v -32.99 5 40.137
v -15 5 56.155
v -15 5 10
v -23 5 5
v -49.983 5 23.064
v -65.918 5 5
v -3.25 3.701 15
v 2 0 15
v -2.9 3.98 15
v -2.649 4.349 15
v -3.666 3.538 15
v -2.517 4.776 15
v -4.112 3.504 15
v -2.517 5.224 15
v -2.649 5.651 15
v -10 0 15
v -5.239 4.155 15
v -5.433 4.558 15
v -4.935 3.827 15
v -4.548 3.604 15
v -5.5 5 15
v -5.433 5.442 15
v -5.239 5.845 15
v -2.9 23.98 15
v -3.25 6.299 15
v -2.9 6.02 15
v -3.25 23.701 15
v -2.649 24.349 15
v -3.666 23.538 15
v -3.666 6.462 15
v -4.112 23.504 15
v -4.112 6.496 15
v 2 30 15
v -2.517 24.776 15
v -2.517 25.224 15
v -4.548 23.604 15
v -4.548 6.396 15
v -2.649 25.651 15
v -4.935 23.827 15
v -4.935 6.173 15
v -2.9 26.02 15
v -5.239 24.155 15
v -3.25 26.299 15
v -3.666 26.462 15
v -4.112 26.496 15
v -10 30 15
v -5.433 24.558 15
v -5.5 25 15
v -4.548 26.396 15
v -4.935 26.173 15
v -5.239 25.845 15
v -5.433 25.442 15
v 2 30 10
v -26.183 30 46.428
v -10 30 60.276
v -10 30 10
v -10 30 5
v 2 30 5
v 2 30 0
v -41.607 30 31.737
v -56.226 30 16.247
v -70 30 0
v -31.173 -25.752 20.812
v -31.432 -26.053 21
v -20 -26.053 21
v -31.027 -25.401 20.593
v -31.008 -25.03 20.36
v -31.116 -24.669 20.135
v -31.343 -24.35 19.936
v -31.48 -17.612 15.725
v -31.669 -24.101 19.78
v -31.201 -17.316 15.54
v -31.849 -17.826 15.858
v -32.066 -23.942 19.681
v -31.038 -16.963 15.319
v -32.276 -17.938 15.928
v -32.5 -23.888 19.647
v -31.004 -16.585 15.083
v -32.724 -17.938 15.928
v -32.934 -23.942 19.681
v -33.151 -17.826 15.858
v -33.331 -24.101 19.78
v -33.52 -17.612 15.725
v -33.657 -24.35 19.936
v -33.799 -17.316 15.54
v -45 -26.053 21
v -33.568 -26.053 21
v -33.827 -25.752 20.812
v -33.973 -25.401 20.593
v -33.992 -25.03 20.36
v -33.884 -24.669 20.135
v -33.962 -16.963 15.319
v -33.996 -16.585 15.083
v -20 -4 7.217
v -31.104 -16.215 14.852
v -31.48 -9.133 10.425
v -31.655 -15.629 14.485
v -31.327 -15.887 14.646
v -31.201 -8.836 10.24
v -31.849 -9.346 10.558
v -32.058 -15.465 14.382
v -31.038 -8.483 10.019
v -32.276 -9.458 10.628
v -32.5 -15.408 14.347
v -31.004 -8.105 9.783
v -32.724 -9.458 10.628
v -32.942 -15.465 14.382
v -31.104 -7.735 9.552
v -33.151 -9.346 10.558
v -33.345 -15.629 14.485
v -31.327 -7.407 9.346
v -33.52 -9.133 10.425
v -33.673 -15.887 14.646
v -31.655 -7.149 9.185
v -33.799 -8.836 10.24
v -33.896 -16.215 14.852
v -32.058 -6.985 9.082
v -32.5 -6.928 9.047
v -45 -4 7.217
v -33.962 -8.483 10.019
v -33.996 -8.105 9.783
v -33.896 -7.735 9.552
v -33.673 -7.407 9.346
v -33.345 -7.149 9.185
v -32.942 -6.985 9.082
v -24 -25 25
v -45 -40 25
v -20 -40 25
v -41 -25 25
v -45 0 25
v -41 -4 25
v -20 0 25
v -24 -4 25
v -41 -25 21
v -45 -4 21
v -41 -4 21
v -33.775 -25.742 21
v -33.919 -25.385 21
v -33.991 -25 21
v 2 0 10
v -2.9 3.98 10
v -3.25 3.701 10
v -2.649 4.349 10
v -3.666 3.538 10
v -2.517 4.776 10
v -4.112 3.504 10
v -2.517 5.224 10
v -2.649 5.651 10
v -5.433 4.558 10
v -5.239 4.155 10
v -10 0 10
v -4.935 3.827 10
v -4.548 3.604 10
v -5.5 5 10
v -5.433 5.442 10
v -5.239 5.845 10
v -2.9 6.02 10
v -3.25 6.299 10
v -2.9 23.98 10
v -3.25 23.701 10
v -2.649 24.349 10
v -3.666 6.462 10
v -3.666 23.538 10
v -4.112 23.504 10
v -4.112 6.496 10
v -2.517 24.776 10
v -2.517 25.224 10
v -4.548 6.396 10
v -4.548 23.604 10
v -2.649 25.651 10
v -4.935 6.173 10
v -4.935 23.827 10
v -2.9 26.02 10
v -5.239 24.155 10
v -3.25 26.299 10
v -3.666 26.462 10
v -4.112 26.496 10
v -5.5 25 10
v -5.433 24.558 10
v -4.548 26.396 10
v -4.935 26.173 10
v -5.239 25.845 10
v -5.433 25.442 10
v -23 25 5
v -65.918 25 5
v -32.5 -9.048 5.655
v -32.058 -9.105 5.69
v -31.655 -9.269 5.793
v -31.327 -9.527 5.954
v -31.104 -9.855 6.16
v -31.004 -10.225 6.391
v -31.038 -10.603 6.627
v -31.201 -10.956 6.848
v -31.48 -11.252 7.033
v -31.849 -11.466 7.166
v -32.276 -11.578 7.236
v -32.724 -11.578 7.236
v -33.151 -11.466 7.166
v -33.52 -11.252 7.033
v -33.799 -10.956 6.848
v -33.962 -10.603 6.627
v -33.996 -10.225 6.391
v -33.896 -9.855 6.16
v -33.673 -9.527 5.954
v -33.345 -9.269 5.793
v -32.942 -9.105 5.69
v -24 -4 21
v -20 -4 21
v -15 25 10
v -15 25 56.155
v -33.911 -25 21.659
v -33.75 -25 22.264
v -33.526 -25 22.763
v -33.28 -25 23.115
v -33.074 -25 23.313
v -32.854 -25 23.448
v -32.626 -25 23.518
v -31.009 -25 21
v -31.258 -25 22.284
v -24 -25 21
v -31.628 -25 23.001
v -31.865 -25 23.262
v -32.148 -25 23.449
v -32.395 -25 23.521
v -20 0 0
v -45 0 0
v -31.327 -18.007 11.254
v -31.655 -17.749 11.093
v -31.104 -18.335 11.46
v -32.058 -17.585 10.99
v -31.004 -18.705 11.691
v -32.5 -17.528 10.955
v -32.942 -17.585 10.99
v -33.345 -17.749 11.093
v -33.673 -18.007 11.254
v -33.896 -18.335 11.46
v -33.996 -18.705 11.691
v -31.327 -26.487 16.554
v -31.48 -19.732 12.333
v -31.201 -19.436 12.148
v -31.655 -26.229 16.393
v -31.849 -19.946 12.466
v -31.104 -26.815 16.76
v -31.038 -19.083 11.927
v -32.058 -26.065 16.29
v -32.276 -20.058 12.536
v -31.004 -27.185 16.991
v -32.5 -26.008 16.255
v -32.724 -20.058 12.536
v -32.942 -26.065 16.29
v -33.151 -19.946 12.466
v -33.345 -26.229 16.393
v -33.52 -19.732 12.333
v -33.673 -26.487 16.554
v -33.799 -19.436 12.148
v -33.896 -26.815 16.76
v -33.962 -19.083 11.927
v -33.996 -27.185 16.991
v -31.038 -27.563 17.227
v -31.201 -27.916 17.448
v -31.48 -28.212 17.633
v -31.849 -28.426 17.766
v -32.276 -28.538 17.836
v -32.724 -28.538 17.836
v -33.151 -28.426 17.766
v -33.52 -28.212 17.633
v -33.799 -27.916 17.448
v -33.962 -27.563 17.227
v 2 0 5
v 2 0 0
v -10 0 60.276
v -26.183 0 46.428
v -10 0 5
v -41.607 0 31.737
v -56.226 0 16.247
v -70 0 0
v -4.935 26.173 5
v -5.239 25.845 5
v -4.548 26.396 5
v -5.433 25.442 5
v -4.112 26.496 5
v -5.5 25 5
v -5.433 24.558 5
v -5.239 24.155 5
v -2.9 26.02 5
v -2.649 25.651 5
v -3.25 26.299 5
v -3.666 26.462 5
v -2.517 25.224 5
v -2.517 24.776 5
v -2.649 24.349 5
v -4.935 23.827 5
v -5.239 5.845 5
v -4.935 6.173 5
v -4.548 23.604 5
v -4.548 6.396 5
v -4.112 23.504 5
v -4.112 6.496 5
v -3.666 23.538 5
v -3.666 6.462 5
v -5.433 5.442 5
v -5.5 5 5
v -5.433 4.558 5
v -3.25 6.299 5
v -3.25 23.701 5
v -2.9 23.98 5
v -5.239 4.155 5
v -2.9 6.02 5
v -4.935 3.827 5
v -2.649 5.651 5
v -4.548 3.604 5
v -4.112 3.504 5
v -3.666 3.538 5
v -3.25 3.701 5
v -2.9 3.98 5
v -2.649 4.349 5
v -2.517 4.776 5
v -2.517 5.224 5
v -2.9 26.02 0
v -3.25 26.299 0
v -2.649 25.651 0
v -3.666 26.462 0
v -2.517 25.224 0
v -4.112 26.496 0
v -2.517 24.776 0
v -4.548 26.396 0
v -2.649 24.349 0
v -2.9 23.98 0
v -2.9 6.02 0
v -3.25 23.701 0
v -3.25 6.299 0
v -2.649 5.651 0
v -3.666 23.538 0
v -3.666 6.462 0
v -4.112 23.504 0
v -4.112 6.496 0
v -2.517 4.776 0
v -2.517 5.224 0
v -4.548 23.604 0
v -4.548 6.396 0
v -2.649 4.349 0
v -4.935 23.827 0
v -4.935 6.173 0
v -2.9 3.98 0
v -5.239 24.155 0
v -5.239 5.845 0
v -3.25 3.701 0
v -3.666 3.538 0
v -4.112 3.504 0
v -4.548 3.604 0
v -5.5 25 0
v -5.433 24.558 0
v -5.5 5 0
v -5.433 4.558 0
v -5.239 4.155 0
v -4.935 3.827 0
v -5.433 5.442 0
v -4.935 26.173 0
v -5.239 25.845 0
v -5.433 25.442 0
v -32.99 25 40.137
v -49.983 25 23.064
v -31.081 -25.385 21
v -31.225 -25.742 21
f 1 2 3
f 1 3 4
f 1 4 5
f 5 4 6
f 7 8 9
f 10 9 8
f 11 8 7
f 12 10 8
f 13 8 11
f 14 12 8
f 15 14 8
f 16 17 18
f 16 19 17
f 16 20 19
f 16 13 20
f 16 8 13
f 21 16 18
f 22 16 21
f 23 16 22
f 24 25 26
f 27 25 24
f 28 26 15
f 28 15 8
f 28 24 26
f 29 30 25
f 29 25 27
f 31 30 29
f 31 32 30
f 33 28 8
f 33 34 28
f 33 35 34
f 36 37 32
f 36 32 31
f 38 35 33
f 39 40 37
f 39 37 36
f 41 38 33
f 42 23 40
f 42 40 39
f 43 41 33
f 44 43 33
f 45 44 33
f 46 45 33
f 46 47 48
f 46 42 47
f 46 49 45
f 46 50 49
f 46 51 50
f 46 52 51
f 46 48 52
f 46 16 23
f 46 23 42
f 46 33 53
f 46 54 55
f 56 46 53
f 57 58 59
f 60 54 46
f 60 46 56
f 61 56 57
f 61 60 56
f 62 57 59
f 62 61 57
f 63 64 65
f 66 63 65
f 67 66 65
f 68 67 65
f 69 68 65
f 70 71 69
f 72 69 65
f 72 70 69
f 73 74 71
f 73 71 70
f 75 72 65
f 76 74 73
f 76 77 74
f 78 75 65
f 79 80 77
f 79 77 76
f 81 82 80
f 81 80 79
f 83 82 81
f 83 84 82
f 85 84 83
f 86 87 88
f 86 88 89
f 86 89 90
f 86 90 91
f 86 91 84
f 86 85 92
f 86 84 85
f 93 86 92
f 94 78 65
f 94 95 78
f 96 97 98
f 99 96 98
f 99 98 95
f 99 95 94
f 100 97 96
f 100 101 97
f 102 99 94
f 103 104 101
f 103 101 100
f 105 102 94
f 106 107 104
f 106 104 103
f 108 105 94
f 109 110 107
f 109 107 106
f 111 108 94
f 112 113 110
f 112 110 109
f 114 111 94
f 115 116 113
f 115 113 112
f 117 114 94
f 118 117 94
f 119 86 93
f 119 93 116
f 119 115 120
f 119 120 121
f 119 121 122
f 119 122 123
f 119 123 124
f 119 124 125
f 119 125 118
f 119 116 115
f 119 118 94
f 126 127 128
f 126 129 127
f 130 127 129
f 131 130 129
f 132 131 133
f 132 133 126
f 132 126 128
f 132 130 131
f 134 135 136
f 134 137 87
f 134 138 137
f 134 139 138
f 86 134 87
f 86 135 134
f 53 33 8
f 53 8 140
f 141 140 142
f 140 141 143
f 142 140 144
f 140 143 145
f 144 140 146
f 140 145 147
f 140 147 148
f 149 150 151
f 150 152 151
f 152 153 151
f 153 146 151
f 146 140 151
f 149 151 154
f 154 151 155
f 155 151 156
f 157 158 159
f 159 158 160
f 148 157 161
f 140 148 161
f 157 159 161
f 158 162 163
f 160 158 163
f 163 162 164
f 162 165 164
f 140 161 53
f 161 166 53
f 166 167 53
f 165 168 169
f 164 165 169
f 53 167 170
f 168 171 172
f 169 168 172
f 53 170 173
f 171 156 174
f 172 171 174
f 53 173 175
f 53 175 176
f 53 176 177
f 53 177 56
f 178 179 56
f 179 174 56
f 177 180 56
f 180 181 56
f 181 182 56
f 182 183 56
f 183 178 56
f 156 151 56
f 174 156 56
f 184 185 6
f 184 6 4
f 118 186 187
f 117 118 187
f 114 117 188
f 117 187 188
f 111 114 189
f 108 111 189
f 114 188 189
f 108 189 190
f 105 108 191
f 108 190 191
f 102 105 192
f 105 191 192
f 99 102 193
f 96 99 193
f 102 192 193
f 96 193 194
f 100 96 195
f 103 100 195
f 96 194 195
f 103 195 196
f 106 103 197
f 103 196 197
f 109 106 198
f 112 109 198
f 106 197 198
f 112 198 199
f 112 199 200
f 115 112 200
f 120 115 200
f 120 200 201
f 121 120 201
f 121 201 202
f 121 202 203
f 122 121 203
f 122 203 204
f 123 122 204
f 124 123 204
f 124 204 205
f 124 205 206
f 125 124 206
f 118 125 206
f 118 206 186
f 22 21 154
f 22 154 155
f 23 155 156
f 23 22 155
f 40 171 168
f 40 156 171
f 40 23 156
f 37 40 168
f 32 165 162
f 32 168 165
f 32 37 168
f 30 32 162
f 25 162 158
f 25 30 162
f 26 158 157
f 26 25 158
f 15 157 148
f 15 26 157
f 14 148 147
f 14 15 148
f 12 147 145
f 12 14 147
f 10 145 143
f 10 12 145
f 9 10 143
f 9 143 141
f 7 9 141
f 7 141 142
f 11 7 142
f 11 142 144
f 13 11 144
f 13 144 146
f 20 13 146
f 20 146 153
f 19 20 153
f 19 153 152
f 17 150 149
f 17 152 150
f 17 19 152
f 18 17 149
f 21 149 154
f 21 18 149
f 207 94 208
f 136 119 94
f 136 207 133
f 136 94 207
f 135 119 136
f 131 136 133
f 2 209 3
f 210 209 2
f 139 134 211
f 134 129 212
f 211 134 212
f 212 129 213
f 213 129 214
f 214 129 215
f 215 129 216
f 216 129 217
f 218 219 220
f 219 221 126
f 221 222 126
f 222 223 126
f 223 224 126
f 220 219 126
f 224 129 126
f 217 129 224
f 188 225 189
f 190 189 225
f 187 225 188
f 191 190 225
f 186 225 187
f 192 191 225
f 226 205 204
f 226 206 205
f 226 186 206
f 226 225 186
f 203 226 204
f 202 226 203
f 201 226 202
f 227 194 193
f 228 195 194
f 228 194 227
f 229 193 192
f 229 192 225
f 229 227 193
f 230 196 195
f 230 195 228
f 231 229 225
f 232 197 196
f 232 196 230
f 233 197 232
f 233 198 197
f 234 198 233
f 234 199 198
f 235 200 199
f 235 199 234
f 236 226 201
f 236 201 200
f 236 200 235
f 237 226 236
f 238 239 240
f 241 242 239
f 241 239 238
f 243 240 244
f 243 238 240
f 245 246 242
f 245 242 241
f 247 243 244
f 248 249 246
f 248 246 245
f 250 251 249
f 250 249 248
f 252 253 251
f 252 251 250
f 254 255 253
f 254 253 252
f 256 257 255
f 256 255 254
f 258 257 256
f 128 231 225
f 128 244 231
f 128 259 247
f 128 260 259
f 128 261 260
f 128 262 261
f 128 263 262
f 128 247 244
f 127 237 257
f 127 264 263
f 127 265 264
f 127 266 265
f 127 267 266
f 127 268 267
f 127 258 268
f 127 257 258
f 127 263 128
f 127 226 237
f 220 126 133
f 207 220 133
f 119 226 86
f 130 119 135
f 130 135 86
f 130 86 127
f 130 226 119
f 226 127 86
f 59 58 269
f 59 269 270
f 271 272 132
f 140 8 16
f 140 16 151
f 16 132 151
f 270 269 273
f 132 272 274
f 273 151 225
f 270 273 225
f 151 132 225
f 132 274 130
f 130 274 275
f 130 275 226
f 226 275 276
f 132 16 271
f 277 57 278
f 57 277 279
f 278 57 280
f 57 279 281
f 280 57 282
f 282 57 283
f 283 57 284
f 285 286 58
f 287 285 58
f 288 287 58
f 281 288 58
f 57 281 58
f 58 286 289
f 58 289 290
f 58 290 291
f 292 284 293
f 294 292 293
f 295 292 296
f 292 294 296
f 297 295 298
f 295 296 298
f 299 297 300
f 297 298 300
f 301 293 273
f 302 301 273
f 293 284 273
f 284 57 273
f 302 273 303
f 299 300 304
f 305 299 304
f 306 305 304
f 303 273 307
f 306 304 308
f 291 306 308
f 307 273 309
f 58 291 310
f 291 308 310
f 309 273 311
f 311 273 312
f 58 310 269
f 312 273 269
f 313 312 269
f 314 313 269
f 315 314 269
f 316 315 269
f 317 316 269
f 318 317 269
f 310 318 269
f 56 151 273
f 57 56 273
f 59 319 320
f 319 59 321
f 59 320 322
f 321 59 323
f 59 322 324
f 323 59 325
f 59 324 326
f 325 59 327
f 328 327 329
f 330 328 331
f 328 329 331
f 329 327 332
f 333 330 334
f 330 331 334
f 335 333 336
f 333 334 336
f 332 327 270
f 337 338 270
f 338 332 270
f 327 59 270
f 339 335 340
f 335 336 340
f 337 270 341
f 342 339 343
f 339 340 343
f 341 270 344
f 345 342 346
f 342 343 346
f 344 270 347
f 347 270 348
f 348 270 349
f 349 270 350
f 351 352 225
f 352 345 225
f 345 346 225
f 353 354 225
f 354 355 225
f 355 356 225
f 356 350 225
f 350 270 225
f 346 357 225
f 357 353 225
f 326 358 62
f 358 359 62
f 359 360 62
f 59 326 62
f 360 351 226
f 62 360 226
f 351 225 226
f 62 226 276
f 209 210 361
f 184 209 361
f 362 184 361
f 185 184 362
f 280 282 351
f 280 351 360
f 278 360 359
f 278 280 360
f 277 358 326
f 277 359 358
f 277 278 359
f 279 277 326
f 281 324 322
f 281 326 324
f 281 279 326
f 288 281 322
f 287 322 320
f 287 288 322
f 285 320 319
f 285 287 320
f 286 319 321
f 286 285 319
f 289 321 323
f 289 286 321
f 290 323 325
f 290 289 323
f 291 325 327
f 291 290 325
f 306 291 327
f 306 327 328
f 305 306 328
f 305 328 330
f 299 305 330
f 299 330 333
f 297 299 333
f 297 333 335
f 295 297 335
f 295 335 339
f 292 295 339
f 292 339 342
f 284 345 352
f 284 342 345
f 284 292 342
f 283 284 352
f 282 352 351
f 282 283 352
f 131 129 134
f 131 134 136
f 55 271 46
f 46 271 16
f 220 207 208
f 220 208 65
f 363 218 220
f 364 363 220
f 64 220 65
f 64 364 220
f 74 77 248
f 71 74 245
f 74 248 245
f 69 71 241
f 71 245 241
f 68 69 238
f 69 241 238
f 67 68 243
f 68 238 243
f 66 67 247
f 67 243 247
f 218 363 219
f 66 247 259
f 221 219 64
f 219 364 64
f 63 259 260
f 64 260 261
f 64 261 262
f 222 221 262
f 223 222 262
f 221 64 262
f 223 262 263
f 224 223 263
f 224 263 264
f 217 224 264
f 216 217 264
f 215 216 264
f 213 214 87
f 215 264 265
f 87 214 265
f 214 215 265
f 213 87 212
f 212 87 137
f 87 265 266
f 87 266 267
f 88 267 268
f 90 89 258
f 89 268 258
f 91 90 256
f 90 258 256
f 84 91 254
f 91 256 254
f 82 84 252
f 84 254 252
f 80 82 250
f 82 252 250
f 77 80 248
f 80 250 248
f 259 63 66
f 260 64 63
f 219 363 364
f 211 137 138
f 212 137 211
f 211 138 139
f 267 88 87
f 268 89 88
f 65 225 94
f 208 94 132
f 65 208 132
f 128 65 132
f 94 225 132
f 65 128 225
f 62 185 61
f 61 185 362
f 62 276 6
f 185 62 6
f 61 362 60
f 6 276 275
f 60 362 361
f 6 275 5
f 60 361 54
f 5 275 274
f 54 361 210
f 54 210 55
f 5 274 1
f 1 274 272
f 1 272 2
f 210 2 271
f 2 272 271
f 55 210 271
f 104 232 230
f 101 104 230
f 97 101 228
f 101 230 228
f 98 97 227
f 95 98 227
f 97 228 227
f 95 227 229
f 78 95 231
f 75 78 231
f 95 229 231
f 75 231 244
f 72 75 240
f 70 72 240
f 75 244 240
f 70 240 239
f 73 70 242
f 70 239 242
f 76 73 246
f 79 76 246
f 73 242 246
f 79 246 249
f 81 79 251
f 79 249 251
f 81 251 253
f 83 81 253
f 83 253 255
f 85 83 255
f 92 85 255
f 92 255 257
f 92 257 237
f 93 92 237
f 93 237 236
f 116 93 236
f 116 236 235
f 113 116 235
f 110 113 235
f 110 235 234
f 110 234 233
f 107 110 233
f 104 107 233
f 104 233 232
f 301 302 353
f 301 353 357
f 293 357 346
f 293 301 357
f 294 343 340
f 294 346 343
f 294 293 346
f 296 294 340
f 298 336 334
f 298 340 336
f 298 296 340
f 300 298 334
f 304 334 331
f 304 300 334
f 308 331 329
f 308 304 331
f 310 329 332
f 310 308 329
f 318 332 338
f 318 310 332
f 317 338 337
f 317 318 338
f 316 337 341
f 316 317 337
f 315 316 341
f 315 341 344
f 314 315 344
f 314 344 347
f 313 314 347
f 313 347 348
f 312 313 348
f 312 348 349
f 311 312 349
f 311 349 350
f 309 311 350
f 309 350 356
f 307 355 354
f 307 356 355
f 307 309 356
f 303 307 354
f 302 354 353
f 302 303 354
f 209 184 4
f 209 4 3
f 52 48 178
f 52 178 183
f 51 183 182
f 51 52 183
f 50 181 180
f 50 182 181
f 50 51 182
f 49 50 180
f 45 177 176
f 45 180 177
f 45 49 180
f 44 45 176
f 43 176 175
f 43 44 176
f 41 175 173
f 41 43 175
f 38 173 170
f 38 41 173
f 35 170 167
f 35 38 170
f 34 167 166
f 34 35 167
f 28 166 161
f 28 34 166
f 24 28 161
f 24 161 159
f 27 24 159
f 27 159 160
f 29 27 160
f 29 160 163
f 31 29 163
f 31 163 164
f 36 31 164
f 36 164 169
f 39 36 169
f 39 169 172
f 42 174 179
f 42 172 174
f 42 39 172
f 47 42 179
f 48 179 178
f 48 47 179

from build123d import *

# Parameters (mm, degrees)
EXTRUDE_1_DEPTH          = 30
CUT_EXTRUDE_1_DEPTH      = 98.124713642
CUT_EXTRUDE_1_DEPTH_BACK = 98.124713642
SKETCH_2_R               = 1.5
CUT_EXTRUDE_6_DEPTH      = 10
EXTRUDE_3_DEPTH          = 12.5
SKETCH_12_W              = 5
SKETCH_12_H              = 30
EXTRUDE_4_DEPTH          = 2
SKETCH_17_W              = 25
SKETCH_17_H              = 25
EXTRUDE_7_DEPTH          = 40
CUT_EXTRUDE_9_DEPTH      = 50
SKETCH_21_R              = 1.5
CUT_EXTRUDE_12_DEPTH     = 7
CUT_EXTRUDE_13_DEPTH     = 500
SKETCH_23_W              = 17
SKETCH_23_H              = 21
CUT_EXTRUDE_14_DEPTH     = 4


with BuildPart() as part:
    # 草图1 → 凸台-拉伸1 (new body)
    with BuildSketch(Plane(origin=(0, 0, 0), x_dir=(1, 0, 0), z_dir=(0, 1, 0))):
        with BuildLine():
            Line((0, 0), (-70, 0))
            ThreePointArc((-70, 0), (-41.606545869, -31.737243891), (-10, -60.276114672))
            Line((-10, -60.276114672), (-10, -15))
            Line((-10, -15), (0, -15))
            Line((0, -15), (0, -10))
            Line((0, -10), (-10, -10))
            Line((-10, -10), (-10, -5))
            Line((-10, -5), (0, -5))
            Line((0, -5), (0, 0))
        make_face()
    extrude(amount=EXTRUDE_1_DEPTH)

    # 草图2 → 切除-拉伸1 (cut, two sides: drawn at the far end of the back side and taken through both)
    with BuildSketch(Plane(origin=(0, 0, 0), x_dir=(-1, 0, 0), z_dir=(0, 0, -1)).offset(-CUT_EXTRUDE_1_DEPTH_BACK)):
        with Locations((4, 25)):
            Circle(SKETCH_2_R)
        with Locations((4, 5)):
            Circle(SKETCH_2_R)
    extrude(amount=CUT_EXTRUDE_1_DEPTH + CUT_EXTRUDE_1_DEPTH_BACK, mode=Mode.SUBTRACT)

    # 草图9 → 切除-拉伸6 (cut, symmetric)
    with BuildSketch(Plane(origin=(0, 15, 0), x_dir=(1, 0, 0), z_dir=(0, 1, 0))):
        with BuildLine():
            Line((-65.918016471, -5), (-59.391772218, -5))
            Line((-59.391772218, -5), (-15, -5))
            Line((-15, -5), (-15, -15))
            Line((-15, -15), (-15, -49.60330608))
            Line((-15, -49.60330608), (-15, -56.155472209))
            ThreePointArc((-15, -56.155472209), (-41.615194331, -31.728555364), (-65.918016471, -5))
        make_face()
    extrude(amount=CUT_EXTRUDE_6_DEPTH, both=True, mode=Mode.SUBTRACT)

    # 草图11 → 凸台-拉伸3 (add, symmetric)
    with BuildSketch(Plane(origin=(0, 15, 0), x_dir=(1, 0, 0), z_dir=(0, 1, 0))):
        Polygon((-15, -5), (-23, -5), (-15, -10), align=None)
    extrude(amount=EXTRUDE_3_DEPTH, both=True)

    # 草图12 → 凸台-拉伸4 (add)
    with BuildSketch(Plane(origin=(0, 0, 0), x_dir=(0, 0, -1), z_dir=(1, 0, 0))):
        with Locations((-12.5, 15)):
            Rectangle(SKETCH_12_W, SKETCH_12_H)
        with Locations((-2.5, 15)):
            Rectangle(SKETCH_12_W, SKETCH_12_H)
    extrude(amount=EXTRUDE_4_DEPTH)

    # 草图17 → 凸台-拉伸7 (add)
    with BuildSketch(Plane.XZ):
        with Locations((-32.5, 12.5)):
            Rectangle(SKETCH_17_W, SKETCH_17_H)
    extrude(amount=EXTRUDE_7_DEPTH)

    # 草图18 → 切除-拉伸9 (cut)
    with BuildSketch(Plane.ZY.offset(45)):
        Polygon((0, 0), (25, -40), (0, -40), align=None)
    extrude(amount=-CUT_EXTRUDE_9_DEPTH, mode=Mode.SUBTRACT)

    # 草图21 → 切除-拉伸12 (cut)
    with BuildSketch(Plane(origin=(0, 0, 0), x_dir=(-1, 0, 0), z_dir=(0, -0.52999894000318, -0.8479983040050879))):
        with Locations(Location((32.5, -22.16990566, 0), (0, 0, 90))):
            Circle(SKETCH_21_R)
        with Locations(Location((32.5, -12.16990566, 0), (0, 0, 90))):
            Circle(SKETCH_21_R)
        with Locations(Location((32.5, -32.16990566, 0), (0, 0, 90))):
            Circle(SKETCH_21_R)
    extrude(amount=-CUT_EXTRUDE_12_DEPTH, mode=Mode.SUBTRACT)

    # 草图22 → 切除-拉伸13 (cut)
    with BuildSketch(Plane.ZY.offset(45)):
        Polygon((7.216990566, -4), (21, -4), (21, -26.052815094), align=None)
    extrude(amount=-CUT_EXTRUDE_13_DEPTH, mode=Mode.SUBTRACT)

    # 草图23 → 切除-拉伸14 (cut)
    with BuildSketch(Plane.XY.offset(25)):
        with Locations((-32.5, -14.5)):
            Rectangle(SKETCH_23_W, SKETCH_23_H)
    extrude(amount=-CUT_EXTRUDE_14_DEPTH, mode=Mode.SUBTRACT)


solid = part.part
